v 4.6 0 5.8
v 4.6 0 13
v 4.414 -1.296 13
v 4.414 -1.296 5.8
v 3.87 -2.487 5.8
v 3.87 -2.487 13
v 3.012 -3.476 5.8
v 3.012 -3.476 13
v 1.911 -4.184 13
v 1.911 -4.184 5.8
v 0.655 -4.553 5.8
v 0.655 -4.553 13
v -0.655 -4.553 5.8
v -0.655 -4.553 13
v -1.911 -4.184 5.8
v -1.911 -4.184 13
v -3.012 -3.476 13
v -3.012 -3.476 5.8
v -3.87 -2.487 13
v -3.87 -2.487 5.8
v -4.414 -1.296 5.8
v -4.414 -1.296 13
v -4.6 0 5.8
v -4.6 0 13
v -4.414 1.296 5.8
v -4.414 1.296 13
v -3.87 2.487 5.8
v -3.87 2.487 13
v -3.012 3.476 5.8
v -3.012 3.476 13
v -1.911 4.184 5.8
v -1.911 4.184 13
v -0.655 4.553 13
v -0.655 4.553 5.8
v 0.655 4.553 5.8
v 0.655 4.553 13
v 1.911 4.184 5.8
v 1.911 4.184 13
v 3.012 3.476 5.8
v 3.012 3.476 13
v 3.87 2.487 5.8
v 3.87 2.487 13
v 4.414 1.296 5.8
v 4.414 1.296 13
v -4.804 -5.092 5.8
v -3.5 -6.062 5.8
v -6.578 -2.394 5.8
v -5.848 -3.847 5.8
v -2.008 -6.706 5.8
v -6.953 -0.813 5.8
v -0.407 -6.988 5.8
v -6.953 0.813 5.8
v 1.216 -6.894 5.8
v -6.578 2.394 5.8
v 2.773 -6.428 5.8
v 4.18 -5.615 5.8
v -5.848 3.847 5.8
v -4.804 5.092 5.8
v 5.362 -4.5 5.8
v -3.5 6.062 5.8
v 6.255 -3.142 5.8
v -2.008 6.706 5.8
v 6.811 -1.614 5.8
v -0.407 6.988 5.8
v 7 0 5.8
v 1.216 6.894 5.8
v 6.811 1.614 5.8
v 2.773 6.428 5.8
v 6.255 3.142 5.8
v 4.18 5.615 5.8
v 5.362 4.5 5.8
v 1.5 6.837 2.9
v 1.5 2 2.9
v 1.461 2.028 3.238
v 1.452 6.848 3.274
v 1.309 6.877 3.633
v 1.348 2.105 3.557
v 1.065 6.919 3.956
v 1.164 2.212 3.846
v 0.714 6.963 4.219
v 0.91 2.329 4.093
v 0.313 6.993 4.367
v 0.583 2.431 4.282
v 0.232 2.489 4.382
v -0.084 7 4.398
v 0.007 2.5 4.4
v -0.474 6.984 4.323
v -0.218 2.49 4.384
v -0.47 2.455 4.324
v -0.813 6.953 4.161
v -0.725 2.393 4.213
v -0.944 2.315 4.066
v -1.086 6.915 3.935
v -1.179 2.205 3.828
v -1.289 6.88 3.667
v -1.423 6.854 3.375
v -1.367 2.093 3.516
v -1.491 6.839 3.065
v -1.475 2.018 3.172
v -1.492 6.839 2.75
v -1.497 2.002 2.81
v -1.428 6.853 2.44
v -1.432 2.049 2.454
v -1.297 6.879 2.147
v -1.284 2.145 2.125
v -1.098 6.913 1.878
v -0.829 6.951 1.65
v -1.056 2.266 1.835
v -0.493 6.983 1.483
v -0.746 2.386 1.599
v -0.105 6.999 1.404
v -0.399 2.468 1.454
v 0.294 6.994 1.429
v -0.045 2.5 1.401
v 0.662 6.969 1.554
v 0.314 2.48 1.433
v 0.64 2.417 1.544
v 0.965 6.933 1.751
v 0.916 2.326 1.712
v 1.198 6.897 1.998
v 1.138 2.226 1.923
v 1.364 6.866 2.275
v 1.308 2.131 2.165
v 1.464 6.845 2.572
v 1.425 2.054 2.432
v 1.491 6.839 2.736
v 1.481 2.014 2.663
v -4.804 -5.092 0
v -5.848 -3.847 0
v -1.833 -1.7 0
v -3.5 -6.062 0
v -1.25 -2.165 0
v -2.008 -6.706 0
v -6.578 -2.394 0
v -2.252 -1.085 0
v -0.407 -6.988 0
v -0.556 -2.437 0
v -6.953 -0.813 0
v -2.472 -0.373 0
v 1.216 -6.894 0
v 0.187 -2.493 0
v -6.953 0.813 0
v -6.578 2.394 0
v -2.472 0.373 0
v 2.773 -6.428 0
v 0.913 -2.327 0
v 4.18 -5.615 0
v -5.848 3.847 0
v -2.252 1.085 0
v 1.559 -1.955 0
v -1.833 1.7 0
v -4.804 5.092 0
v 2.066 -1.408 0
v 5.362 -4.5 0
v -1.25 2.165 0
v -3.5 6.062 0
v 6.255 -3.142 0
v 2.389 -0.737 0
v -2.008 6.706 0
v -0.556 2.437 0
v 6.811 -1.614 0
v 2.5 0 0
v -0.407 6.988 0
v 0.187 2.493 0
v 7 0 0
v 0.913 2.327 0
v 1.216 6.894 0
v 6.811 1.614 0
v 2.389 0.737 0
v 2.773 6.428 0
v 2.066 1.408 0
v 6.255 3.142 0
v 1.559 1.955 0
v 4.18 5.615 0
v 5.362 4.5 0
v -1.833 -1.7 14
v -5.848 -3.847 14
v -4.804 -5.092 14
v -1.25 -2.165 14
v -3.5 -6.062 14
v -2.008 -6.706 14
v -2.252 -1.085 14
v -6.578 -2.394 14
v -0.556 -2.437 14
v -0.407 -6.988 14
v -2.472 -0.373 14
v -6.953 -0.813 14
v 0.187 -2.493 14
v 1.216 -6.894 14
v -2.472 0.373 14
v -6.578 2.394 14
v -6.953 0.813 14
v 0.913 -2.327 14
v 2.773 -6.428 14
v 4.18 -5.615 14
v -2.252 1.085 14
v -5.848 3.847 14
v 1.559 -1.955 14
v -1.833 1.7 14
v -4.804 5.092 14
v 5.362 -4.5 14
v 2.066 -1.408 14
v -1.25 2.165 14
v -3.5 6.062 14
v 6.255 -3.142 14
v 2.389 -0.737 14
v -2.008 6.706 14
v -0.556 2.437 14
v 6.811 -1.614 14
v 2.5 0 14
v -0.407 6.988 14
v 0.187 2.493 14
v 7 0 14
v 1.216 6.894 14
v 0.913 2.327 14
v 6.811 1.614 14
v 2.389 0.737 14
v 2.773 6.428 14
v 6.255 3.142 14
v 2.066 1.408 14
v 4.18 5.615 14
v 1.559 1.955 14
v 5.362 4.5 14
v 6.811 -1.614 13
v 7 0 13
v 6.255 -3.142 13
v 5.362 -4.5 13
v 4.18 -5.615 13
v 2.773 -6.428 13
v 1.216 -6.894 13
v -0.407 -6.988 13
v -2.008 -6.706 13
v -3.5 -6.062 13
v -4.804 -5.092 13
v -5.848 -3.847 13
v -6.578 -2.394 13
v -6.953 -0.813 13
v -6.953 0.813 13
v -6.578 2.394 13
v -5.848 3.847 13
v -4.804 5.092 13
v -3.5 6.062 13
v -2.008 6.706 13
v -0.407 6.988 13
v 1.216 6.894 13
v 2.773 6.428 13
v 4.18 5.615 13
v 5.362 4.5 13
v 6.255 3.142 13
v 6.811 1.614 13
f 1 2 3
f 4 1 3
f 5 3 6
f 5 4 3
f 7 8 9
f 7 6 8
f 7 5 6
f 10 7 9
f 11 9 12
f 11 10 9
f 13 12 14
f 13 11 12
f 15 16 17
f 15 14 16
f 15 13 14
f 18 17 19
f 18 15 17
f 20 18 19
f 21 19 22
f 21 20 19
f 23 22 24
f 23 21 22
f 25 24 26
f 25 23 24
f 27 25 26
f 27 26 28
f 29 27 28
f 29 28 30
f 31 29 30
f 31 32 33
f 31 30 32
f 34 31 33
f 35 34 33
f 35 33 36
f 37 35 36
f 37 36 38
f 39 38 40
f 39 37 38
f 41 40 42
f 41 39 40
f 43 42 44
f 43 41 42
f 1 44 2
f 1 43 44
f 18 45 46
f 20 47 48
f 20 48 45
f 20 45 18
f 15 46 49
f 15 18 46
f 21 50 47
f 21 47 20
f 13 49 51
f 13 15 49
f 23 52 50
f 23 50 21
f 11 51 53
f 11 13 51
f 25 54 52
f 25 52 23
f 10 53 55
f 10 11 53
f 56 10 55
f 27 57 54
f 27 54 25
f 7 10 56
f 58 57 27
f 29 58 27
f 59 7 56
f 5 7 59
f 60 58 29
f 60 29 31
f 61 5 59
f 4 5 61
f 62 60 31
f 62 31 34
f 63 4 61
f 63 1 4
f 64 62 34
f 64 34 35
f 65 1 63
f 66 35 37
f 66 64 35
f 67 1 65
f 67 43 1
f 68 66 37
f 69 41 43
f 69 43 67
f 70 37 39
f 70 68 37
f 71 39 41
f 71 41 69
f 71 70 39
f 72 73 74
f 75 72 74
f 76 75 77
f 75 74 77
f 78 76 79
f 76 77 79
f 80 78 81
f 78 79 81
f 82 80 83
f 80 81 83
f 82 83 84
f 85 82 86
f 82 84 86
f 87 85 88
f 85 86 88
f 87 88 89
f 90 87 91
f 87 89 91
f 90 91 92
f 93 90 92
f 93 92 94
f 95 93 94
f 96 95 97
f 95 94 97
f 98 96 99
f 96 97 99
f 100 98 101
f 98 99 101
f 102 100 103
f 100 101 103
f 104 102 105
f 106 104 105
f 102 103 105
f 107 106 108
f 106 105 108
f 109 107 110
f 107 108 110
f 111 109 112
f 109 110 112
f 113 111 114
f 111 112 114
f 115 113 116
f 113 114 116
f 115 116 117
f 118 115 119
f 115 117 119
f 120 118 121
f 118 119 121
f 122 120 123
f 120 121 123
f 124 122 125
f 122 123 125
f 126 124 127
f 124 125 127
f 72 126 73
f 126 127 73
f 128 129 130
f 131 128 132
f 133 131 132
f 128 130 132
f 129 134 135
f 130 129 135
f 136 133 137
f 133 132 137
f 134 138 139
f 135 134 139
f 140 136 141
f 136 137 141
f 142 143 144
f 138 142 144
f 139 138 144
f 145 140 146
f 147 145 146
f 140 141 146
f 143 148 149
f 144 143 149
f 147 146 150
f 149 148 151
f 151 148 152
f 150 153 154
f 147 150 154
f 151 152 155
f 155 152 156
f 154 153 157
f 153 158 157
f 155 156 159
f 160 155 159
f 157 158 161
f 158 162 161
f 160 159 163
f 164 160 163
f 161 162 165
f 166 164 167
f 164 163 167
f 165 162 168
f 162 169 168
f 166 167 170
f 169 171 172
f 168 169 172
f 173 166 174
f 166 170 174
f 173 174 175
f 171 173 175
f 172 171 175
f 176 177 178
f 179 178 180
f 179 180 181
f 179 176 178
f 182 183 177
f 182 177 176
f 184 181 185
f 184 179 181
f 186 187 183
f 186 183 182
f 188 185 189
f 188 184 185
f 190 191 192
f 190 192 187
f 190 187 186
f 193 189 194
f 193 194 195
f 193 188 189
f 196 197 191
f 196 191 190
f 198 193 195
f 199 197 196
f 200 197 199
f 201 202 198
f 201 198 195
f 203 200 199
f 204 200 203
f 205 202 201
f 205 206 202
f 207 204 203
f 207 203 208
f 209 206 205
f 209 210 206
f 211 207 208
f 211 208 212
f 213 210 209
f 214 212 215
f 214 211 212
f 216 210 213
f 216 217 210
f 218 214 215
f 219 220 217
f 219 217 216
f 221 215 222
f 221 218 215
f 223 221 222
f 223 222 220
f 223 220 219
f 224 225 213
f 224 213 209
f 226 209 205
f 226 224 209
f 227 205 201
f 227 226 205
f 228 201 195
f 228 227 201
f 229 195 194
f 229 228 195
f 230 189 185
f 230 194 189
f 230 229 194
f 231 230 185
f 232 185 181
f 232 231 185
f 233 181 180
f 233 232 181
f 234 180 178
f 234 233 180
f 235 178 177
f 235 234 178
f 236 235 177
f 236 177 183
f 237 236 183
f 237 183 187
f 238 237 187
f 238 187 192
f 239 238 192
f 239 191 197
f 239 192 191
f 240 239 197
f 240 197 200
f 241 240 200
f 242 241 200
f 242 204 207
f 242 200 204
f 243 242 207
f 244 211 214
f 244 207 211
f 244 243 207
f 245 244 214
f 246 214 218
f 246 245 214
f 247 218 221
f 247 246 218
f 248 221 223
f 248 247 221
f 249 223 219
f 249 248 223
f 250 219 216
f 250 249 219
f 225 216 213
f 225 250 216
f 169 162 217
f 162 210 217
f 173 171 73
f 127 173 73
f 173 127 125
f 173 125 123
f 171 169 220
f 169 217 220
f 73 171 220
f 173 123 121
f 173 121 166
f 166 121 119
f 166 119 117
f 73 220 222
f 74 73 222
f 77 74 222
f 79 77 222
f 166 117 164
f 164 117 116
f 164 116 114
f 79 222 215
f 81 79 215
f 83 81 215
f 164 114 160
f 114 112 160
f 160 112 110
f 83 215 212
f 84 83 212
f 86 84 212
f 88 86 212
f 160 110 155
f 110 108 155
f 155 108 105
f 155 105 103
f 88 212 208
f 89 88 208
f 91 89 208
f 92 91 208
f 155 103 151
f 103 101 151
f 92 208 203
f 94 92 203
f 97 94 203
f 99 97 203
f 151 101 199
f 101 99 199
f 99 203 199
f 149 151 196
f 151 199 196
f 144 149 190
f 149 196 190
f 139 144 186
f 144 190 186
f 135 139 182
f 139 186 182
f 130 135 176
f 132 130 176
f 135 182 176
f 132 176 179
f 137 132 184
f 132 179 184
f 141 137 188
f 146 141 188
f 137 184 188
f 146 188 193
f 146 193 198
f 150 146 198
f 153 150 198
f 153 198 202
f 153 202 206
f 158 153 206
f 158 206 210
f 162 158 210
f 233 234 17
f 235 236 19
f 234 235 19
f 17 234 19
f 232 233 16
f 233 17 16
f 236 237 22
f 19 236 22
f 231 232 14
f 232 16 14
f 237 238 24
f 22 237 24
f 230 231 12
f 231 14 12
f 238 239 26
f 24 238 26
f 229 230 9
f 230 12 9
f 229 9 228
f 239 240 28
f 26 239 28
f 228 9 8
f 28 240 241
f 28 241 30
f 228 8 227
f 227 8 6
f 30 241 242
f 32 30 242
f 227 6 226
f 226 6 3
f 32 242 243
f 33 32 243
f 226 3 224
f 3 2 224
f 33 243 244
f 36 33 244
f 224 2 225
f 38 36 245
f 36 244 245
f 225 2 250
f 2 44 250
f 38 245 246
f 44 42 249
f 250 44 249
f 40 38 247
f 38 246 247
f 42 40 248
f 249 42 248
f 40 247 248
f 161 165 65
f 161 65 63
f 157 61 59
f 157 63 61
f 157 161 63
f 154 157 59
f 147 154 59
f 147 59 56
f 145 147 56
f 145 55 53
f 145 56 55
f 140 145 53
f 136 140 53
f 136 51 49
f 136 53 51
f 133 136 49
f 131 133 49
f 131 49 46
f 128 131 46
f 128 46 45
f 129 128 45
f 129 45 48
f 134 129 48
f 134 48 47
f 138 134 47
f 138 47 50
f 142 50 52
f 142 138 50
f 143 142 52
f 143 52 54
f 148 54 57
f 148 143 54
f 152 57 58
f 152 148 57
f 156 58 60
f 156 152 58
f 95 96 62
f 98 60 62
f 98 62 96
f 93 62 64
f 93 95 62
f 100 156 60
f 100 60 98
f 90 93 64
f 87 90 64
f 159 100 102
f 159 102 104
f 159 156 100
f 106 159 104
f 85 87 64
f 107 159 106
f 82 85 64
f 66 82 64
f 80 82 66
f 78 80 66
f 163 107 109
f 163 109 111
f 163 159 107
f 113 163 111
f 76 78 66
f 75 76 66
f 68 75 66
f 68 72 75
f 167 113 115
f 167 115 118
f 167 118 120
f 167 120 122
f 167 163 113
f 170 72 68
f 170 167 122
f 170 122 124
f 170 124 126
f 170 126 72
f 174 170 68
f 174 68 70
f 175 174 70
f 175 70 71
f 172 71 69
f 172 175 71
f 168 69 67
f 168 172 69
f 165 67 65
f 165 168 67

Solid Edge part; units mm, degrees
sketch "Sketch1" plane through (0, 0, 0) normal (0, 0, 1) x (1, 0, 0)
  circle A0 centre (0, 0) radius 7
extrude "Protrusion1" add sketch "Sketch1" along normal blind 5.8
sketch "Sketch2" plane through (0, 0, 5.8) normal (0, 0, 1) x (1, 0, 0)
  circle A0 centre (0, 0) radius 4.6
extrude "ExtrudedProtrusion_2" add sketch "Sketch2" along normal blind 7.2
sketch "Sketch3" plane through (0, 0, 13) normal (0, 0, 1) x (1, 0, 0)
  circle A0 centre (0, 0) radius 7
extrude "ExtrudedProtrusion_3" add sketch "Sketch3" along normal blind 1
sketch "Sketch4" plane through (0, 0, 0) normal (0, -1, 0) x (1, 0, 0)
  circle A0 centre (0, 2.9) radius 1.5
extrude "ExtrudedCutout_1" cut sketch "Sketch4" against normal blind 115.8762
sketch "Sketch5" plane through (0, 0, 14) normal (0, 0, 1) x (1, 0, 0)
  circle A0 centre (0, 0) radius 2.5
extrude "Cutout1" cut sketch "Sketch5" against normal through all
properties material "ABS Plastic, medium impact"
